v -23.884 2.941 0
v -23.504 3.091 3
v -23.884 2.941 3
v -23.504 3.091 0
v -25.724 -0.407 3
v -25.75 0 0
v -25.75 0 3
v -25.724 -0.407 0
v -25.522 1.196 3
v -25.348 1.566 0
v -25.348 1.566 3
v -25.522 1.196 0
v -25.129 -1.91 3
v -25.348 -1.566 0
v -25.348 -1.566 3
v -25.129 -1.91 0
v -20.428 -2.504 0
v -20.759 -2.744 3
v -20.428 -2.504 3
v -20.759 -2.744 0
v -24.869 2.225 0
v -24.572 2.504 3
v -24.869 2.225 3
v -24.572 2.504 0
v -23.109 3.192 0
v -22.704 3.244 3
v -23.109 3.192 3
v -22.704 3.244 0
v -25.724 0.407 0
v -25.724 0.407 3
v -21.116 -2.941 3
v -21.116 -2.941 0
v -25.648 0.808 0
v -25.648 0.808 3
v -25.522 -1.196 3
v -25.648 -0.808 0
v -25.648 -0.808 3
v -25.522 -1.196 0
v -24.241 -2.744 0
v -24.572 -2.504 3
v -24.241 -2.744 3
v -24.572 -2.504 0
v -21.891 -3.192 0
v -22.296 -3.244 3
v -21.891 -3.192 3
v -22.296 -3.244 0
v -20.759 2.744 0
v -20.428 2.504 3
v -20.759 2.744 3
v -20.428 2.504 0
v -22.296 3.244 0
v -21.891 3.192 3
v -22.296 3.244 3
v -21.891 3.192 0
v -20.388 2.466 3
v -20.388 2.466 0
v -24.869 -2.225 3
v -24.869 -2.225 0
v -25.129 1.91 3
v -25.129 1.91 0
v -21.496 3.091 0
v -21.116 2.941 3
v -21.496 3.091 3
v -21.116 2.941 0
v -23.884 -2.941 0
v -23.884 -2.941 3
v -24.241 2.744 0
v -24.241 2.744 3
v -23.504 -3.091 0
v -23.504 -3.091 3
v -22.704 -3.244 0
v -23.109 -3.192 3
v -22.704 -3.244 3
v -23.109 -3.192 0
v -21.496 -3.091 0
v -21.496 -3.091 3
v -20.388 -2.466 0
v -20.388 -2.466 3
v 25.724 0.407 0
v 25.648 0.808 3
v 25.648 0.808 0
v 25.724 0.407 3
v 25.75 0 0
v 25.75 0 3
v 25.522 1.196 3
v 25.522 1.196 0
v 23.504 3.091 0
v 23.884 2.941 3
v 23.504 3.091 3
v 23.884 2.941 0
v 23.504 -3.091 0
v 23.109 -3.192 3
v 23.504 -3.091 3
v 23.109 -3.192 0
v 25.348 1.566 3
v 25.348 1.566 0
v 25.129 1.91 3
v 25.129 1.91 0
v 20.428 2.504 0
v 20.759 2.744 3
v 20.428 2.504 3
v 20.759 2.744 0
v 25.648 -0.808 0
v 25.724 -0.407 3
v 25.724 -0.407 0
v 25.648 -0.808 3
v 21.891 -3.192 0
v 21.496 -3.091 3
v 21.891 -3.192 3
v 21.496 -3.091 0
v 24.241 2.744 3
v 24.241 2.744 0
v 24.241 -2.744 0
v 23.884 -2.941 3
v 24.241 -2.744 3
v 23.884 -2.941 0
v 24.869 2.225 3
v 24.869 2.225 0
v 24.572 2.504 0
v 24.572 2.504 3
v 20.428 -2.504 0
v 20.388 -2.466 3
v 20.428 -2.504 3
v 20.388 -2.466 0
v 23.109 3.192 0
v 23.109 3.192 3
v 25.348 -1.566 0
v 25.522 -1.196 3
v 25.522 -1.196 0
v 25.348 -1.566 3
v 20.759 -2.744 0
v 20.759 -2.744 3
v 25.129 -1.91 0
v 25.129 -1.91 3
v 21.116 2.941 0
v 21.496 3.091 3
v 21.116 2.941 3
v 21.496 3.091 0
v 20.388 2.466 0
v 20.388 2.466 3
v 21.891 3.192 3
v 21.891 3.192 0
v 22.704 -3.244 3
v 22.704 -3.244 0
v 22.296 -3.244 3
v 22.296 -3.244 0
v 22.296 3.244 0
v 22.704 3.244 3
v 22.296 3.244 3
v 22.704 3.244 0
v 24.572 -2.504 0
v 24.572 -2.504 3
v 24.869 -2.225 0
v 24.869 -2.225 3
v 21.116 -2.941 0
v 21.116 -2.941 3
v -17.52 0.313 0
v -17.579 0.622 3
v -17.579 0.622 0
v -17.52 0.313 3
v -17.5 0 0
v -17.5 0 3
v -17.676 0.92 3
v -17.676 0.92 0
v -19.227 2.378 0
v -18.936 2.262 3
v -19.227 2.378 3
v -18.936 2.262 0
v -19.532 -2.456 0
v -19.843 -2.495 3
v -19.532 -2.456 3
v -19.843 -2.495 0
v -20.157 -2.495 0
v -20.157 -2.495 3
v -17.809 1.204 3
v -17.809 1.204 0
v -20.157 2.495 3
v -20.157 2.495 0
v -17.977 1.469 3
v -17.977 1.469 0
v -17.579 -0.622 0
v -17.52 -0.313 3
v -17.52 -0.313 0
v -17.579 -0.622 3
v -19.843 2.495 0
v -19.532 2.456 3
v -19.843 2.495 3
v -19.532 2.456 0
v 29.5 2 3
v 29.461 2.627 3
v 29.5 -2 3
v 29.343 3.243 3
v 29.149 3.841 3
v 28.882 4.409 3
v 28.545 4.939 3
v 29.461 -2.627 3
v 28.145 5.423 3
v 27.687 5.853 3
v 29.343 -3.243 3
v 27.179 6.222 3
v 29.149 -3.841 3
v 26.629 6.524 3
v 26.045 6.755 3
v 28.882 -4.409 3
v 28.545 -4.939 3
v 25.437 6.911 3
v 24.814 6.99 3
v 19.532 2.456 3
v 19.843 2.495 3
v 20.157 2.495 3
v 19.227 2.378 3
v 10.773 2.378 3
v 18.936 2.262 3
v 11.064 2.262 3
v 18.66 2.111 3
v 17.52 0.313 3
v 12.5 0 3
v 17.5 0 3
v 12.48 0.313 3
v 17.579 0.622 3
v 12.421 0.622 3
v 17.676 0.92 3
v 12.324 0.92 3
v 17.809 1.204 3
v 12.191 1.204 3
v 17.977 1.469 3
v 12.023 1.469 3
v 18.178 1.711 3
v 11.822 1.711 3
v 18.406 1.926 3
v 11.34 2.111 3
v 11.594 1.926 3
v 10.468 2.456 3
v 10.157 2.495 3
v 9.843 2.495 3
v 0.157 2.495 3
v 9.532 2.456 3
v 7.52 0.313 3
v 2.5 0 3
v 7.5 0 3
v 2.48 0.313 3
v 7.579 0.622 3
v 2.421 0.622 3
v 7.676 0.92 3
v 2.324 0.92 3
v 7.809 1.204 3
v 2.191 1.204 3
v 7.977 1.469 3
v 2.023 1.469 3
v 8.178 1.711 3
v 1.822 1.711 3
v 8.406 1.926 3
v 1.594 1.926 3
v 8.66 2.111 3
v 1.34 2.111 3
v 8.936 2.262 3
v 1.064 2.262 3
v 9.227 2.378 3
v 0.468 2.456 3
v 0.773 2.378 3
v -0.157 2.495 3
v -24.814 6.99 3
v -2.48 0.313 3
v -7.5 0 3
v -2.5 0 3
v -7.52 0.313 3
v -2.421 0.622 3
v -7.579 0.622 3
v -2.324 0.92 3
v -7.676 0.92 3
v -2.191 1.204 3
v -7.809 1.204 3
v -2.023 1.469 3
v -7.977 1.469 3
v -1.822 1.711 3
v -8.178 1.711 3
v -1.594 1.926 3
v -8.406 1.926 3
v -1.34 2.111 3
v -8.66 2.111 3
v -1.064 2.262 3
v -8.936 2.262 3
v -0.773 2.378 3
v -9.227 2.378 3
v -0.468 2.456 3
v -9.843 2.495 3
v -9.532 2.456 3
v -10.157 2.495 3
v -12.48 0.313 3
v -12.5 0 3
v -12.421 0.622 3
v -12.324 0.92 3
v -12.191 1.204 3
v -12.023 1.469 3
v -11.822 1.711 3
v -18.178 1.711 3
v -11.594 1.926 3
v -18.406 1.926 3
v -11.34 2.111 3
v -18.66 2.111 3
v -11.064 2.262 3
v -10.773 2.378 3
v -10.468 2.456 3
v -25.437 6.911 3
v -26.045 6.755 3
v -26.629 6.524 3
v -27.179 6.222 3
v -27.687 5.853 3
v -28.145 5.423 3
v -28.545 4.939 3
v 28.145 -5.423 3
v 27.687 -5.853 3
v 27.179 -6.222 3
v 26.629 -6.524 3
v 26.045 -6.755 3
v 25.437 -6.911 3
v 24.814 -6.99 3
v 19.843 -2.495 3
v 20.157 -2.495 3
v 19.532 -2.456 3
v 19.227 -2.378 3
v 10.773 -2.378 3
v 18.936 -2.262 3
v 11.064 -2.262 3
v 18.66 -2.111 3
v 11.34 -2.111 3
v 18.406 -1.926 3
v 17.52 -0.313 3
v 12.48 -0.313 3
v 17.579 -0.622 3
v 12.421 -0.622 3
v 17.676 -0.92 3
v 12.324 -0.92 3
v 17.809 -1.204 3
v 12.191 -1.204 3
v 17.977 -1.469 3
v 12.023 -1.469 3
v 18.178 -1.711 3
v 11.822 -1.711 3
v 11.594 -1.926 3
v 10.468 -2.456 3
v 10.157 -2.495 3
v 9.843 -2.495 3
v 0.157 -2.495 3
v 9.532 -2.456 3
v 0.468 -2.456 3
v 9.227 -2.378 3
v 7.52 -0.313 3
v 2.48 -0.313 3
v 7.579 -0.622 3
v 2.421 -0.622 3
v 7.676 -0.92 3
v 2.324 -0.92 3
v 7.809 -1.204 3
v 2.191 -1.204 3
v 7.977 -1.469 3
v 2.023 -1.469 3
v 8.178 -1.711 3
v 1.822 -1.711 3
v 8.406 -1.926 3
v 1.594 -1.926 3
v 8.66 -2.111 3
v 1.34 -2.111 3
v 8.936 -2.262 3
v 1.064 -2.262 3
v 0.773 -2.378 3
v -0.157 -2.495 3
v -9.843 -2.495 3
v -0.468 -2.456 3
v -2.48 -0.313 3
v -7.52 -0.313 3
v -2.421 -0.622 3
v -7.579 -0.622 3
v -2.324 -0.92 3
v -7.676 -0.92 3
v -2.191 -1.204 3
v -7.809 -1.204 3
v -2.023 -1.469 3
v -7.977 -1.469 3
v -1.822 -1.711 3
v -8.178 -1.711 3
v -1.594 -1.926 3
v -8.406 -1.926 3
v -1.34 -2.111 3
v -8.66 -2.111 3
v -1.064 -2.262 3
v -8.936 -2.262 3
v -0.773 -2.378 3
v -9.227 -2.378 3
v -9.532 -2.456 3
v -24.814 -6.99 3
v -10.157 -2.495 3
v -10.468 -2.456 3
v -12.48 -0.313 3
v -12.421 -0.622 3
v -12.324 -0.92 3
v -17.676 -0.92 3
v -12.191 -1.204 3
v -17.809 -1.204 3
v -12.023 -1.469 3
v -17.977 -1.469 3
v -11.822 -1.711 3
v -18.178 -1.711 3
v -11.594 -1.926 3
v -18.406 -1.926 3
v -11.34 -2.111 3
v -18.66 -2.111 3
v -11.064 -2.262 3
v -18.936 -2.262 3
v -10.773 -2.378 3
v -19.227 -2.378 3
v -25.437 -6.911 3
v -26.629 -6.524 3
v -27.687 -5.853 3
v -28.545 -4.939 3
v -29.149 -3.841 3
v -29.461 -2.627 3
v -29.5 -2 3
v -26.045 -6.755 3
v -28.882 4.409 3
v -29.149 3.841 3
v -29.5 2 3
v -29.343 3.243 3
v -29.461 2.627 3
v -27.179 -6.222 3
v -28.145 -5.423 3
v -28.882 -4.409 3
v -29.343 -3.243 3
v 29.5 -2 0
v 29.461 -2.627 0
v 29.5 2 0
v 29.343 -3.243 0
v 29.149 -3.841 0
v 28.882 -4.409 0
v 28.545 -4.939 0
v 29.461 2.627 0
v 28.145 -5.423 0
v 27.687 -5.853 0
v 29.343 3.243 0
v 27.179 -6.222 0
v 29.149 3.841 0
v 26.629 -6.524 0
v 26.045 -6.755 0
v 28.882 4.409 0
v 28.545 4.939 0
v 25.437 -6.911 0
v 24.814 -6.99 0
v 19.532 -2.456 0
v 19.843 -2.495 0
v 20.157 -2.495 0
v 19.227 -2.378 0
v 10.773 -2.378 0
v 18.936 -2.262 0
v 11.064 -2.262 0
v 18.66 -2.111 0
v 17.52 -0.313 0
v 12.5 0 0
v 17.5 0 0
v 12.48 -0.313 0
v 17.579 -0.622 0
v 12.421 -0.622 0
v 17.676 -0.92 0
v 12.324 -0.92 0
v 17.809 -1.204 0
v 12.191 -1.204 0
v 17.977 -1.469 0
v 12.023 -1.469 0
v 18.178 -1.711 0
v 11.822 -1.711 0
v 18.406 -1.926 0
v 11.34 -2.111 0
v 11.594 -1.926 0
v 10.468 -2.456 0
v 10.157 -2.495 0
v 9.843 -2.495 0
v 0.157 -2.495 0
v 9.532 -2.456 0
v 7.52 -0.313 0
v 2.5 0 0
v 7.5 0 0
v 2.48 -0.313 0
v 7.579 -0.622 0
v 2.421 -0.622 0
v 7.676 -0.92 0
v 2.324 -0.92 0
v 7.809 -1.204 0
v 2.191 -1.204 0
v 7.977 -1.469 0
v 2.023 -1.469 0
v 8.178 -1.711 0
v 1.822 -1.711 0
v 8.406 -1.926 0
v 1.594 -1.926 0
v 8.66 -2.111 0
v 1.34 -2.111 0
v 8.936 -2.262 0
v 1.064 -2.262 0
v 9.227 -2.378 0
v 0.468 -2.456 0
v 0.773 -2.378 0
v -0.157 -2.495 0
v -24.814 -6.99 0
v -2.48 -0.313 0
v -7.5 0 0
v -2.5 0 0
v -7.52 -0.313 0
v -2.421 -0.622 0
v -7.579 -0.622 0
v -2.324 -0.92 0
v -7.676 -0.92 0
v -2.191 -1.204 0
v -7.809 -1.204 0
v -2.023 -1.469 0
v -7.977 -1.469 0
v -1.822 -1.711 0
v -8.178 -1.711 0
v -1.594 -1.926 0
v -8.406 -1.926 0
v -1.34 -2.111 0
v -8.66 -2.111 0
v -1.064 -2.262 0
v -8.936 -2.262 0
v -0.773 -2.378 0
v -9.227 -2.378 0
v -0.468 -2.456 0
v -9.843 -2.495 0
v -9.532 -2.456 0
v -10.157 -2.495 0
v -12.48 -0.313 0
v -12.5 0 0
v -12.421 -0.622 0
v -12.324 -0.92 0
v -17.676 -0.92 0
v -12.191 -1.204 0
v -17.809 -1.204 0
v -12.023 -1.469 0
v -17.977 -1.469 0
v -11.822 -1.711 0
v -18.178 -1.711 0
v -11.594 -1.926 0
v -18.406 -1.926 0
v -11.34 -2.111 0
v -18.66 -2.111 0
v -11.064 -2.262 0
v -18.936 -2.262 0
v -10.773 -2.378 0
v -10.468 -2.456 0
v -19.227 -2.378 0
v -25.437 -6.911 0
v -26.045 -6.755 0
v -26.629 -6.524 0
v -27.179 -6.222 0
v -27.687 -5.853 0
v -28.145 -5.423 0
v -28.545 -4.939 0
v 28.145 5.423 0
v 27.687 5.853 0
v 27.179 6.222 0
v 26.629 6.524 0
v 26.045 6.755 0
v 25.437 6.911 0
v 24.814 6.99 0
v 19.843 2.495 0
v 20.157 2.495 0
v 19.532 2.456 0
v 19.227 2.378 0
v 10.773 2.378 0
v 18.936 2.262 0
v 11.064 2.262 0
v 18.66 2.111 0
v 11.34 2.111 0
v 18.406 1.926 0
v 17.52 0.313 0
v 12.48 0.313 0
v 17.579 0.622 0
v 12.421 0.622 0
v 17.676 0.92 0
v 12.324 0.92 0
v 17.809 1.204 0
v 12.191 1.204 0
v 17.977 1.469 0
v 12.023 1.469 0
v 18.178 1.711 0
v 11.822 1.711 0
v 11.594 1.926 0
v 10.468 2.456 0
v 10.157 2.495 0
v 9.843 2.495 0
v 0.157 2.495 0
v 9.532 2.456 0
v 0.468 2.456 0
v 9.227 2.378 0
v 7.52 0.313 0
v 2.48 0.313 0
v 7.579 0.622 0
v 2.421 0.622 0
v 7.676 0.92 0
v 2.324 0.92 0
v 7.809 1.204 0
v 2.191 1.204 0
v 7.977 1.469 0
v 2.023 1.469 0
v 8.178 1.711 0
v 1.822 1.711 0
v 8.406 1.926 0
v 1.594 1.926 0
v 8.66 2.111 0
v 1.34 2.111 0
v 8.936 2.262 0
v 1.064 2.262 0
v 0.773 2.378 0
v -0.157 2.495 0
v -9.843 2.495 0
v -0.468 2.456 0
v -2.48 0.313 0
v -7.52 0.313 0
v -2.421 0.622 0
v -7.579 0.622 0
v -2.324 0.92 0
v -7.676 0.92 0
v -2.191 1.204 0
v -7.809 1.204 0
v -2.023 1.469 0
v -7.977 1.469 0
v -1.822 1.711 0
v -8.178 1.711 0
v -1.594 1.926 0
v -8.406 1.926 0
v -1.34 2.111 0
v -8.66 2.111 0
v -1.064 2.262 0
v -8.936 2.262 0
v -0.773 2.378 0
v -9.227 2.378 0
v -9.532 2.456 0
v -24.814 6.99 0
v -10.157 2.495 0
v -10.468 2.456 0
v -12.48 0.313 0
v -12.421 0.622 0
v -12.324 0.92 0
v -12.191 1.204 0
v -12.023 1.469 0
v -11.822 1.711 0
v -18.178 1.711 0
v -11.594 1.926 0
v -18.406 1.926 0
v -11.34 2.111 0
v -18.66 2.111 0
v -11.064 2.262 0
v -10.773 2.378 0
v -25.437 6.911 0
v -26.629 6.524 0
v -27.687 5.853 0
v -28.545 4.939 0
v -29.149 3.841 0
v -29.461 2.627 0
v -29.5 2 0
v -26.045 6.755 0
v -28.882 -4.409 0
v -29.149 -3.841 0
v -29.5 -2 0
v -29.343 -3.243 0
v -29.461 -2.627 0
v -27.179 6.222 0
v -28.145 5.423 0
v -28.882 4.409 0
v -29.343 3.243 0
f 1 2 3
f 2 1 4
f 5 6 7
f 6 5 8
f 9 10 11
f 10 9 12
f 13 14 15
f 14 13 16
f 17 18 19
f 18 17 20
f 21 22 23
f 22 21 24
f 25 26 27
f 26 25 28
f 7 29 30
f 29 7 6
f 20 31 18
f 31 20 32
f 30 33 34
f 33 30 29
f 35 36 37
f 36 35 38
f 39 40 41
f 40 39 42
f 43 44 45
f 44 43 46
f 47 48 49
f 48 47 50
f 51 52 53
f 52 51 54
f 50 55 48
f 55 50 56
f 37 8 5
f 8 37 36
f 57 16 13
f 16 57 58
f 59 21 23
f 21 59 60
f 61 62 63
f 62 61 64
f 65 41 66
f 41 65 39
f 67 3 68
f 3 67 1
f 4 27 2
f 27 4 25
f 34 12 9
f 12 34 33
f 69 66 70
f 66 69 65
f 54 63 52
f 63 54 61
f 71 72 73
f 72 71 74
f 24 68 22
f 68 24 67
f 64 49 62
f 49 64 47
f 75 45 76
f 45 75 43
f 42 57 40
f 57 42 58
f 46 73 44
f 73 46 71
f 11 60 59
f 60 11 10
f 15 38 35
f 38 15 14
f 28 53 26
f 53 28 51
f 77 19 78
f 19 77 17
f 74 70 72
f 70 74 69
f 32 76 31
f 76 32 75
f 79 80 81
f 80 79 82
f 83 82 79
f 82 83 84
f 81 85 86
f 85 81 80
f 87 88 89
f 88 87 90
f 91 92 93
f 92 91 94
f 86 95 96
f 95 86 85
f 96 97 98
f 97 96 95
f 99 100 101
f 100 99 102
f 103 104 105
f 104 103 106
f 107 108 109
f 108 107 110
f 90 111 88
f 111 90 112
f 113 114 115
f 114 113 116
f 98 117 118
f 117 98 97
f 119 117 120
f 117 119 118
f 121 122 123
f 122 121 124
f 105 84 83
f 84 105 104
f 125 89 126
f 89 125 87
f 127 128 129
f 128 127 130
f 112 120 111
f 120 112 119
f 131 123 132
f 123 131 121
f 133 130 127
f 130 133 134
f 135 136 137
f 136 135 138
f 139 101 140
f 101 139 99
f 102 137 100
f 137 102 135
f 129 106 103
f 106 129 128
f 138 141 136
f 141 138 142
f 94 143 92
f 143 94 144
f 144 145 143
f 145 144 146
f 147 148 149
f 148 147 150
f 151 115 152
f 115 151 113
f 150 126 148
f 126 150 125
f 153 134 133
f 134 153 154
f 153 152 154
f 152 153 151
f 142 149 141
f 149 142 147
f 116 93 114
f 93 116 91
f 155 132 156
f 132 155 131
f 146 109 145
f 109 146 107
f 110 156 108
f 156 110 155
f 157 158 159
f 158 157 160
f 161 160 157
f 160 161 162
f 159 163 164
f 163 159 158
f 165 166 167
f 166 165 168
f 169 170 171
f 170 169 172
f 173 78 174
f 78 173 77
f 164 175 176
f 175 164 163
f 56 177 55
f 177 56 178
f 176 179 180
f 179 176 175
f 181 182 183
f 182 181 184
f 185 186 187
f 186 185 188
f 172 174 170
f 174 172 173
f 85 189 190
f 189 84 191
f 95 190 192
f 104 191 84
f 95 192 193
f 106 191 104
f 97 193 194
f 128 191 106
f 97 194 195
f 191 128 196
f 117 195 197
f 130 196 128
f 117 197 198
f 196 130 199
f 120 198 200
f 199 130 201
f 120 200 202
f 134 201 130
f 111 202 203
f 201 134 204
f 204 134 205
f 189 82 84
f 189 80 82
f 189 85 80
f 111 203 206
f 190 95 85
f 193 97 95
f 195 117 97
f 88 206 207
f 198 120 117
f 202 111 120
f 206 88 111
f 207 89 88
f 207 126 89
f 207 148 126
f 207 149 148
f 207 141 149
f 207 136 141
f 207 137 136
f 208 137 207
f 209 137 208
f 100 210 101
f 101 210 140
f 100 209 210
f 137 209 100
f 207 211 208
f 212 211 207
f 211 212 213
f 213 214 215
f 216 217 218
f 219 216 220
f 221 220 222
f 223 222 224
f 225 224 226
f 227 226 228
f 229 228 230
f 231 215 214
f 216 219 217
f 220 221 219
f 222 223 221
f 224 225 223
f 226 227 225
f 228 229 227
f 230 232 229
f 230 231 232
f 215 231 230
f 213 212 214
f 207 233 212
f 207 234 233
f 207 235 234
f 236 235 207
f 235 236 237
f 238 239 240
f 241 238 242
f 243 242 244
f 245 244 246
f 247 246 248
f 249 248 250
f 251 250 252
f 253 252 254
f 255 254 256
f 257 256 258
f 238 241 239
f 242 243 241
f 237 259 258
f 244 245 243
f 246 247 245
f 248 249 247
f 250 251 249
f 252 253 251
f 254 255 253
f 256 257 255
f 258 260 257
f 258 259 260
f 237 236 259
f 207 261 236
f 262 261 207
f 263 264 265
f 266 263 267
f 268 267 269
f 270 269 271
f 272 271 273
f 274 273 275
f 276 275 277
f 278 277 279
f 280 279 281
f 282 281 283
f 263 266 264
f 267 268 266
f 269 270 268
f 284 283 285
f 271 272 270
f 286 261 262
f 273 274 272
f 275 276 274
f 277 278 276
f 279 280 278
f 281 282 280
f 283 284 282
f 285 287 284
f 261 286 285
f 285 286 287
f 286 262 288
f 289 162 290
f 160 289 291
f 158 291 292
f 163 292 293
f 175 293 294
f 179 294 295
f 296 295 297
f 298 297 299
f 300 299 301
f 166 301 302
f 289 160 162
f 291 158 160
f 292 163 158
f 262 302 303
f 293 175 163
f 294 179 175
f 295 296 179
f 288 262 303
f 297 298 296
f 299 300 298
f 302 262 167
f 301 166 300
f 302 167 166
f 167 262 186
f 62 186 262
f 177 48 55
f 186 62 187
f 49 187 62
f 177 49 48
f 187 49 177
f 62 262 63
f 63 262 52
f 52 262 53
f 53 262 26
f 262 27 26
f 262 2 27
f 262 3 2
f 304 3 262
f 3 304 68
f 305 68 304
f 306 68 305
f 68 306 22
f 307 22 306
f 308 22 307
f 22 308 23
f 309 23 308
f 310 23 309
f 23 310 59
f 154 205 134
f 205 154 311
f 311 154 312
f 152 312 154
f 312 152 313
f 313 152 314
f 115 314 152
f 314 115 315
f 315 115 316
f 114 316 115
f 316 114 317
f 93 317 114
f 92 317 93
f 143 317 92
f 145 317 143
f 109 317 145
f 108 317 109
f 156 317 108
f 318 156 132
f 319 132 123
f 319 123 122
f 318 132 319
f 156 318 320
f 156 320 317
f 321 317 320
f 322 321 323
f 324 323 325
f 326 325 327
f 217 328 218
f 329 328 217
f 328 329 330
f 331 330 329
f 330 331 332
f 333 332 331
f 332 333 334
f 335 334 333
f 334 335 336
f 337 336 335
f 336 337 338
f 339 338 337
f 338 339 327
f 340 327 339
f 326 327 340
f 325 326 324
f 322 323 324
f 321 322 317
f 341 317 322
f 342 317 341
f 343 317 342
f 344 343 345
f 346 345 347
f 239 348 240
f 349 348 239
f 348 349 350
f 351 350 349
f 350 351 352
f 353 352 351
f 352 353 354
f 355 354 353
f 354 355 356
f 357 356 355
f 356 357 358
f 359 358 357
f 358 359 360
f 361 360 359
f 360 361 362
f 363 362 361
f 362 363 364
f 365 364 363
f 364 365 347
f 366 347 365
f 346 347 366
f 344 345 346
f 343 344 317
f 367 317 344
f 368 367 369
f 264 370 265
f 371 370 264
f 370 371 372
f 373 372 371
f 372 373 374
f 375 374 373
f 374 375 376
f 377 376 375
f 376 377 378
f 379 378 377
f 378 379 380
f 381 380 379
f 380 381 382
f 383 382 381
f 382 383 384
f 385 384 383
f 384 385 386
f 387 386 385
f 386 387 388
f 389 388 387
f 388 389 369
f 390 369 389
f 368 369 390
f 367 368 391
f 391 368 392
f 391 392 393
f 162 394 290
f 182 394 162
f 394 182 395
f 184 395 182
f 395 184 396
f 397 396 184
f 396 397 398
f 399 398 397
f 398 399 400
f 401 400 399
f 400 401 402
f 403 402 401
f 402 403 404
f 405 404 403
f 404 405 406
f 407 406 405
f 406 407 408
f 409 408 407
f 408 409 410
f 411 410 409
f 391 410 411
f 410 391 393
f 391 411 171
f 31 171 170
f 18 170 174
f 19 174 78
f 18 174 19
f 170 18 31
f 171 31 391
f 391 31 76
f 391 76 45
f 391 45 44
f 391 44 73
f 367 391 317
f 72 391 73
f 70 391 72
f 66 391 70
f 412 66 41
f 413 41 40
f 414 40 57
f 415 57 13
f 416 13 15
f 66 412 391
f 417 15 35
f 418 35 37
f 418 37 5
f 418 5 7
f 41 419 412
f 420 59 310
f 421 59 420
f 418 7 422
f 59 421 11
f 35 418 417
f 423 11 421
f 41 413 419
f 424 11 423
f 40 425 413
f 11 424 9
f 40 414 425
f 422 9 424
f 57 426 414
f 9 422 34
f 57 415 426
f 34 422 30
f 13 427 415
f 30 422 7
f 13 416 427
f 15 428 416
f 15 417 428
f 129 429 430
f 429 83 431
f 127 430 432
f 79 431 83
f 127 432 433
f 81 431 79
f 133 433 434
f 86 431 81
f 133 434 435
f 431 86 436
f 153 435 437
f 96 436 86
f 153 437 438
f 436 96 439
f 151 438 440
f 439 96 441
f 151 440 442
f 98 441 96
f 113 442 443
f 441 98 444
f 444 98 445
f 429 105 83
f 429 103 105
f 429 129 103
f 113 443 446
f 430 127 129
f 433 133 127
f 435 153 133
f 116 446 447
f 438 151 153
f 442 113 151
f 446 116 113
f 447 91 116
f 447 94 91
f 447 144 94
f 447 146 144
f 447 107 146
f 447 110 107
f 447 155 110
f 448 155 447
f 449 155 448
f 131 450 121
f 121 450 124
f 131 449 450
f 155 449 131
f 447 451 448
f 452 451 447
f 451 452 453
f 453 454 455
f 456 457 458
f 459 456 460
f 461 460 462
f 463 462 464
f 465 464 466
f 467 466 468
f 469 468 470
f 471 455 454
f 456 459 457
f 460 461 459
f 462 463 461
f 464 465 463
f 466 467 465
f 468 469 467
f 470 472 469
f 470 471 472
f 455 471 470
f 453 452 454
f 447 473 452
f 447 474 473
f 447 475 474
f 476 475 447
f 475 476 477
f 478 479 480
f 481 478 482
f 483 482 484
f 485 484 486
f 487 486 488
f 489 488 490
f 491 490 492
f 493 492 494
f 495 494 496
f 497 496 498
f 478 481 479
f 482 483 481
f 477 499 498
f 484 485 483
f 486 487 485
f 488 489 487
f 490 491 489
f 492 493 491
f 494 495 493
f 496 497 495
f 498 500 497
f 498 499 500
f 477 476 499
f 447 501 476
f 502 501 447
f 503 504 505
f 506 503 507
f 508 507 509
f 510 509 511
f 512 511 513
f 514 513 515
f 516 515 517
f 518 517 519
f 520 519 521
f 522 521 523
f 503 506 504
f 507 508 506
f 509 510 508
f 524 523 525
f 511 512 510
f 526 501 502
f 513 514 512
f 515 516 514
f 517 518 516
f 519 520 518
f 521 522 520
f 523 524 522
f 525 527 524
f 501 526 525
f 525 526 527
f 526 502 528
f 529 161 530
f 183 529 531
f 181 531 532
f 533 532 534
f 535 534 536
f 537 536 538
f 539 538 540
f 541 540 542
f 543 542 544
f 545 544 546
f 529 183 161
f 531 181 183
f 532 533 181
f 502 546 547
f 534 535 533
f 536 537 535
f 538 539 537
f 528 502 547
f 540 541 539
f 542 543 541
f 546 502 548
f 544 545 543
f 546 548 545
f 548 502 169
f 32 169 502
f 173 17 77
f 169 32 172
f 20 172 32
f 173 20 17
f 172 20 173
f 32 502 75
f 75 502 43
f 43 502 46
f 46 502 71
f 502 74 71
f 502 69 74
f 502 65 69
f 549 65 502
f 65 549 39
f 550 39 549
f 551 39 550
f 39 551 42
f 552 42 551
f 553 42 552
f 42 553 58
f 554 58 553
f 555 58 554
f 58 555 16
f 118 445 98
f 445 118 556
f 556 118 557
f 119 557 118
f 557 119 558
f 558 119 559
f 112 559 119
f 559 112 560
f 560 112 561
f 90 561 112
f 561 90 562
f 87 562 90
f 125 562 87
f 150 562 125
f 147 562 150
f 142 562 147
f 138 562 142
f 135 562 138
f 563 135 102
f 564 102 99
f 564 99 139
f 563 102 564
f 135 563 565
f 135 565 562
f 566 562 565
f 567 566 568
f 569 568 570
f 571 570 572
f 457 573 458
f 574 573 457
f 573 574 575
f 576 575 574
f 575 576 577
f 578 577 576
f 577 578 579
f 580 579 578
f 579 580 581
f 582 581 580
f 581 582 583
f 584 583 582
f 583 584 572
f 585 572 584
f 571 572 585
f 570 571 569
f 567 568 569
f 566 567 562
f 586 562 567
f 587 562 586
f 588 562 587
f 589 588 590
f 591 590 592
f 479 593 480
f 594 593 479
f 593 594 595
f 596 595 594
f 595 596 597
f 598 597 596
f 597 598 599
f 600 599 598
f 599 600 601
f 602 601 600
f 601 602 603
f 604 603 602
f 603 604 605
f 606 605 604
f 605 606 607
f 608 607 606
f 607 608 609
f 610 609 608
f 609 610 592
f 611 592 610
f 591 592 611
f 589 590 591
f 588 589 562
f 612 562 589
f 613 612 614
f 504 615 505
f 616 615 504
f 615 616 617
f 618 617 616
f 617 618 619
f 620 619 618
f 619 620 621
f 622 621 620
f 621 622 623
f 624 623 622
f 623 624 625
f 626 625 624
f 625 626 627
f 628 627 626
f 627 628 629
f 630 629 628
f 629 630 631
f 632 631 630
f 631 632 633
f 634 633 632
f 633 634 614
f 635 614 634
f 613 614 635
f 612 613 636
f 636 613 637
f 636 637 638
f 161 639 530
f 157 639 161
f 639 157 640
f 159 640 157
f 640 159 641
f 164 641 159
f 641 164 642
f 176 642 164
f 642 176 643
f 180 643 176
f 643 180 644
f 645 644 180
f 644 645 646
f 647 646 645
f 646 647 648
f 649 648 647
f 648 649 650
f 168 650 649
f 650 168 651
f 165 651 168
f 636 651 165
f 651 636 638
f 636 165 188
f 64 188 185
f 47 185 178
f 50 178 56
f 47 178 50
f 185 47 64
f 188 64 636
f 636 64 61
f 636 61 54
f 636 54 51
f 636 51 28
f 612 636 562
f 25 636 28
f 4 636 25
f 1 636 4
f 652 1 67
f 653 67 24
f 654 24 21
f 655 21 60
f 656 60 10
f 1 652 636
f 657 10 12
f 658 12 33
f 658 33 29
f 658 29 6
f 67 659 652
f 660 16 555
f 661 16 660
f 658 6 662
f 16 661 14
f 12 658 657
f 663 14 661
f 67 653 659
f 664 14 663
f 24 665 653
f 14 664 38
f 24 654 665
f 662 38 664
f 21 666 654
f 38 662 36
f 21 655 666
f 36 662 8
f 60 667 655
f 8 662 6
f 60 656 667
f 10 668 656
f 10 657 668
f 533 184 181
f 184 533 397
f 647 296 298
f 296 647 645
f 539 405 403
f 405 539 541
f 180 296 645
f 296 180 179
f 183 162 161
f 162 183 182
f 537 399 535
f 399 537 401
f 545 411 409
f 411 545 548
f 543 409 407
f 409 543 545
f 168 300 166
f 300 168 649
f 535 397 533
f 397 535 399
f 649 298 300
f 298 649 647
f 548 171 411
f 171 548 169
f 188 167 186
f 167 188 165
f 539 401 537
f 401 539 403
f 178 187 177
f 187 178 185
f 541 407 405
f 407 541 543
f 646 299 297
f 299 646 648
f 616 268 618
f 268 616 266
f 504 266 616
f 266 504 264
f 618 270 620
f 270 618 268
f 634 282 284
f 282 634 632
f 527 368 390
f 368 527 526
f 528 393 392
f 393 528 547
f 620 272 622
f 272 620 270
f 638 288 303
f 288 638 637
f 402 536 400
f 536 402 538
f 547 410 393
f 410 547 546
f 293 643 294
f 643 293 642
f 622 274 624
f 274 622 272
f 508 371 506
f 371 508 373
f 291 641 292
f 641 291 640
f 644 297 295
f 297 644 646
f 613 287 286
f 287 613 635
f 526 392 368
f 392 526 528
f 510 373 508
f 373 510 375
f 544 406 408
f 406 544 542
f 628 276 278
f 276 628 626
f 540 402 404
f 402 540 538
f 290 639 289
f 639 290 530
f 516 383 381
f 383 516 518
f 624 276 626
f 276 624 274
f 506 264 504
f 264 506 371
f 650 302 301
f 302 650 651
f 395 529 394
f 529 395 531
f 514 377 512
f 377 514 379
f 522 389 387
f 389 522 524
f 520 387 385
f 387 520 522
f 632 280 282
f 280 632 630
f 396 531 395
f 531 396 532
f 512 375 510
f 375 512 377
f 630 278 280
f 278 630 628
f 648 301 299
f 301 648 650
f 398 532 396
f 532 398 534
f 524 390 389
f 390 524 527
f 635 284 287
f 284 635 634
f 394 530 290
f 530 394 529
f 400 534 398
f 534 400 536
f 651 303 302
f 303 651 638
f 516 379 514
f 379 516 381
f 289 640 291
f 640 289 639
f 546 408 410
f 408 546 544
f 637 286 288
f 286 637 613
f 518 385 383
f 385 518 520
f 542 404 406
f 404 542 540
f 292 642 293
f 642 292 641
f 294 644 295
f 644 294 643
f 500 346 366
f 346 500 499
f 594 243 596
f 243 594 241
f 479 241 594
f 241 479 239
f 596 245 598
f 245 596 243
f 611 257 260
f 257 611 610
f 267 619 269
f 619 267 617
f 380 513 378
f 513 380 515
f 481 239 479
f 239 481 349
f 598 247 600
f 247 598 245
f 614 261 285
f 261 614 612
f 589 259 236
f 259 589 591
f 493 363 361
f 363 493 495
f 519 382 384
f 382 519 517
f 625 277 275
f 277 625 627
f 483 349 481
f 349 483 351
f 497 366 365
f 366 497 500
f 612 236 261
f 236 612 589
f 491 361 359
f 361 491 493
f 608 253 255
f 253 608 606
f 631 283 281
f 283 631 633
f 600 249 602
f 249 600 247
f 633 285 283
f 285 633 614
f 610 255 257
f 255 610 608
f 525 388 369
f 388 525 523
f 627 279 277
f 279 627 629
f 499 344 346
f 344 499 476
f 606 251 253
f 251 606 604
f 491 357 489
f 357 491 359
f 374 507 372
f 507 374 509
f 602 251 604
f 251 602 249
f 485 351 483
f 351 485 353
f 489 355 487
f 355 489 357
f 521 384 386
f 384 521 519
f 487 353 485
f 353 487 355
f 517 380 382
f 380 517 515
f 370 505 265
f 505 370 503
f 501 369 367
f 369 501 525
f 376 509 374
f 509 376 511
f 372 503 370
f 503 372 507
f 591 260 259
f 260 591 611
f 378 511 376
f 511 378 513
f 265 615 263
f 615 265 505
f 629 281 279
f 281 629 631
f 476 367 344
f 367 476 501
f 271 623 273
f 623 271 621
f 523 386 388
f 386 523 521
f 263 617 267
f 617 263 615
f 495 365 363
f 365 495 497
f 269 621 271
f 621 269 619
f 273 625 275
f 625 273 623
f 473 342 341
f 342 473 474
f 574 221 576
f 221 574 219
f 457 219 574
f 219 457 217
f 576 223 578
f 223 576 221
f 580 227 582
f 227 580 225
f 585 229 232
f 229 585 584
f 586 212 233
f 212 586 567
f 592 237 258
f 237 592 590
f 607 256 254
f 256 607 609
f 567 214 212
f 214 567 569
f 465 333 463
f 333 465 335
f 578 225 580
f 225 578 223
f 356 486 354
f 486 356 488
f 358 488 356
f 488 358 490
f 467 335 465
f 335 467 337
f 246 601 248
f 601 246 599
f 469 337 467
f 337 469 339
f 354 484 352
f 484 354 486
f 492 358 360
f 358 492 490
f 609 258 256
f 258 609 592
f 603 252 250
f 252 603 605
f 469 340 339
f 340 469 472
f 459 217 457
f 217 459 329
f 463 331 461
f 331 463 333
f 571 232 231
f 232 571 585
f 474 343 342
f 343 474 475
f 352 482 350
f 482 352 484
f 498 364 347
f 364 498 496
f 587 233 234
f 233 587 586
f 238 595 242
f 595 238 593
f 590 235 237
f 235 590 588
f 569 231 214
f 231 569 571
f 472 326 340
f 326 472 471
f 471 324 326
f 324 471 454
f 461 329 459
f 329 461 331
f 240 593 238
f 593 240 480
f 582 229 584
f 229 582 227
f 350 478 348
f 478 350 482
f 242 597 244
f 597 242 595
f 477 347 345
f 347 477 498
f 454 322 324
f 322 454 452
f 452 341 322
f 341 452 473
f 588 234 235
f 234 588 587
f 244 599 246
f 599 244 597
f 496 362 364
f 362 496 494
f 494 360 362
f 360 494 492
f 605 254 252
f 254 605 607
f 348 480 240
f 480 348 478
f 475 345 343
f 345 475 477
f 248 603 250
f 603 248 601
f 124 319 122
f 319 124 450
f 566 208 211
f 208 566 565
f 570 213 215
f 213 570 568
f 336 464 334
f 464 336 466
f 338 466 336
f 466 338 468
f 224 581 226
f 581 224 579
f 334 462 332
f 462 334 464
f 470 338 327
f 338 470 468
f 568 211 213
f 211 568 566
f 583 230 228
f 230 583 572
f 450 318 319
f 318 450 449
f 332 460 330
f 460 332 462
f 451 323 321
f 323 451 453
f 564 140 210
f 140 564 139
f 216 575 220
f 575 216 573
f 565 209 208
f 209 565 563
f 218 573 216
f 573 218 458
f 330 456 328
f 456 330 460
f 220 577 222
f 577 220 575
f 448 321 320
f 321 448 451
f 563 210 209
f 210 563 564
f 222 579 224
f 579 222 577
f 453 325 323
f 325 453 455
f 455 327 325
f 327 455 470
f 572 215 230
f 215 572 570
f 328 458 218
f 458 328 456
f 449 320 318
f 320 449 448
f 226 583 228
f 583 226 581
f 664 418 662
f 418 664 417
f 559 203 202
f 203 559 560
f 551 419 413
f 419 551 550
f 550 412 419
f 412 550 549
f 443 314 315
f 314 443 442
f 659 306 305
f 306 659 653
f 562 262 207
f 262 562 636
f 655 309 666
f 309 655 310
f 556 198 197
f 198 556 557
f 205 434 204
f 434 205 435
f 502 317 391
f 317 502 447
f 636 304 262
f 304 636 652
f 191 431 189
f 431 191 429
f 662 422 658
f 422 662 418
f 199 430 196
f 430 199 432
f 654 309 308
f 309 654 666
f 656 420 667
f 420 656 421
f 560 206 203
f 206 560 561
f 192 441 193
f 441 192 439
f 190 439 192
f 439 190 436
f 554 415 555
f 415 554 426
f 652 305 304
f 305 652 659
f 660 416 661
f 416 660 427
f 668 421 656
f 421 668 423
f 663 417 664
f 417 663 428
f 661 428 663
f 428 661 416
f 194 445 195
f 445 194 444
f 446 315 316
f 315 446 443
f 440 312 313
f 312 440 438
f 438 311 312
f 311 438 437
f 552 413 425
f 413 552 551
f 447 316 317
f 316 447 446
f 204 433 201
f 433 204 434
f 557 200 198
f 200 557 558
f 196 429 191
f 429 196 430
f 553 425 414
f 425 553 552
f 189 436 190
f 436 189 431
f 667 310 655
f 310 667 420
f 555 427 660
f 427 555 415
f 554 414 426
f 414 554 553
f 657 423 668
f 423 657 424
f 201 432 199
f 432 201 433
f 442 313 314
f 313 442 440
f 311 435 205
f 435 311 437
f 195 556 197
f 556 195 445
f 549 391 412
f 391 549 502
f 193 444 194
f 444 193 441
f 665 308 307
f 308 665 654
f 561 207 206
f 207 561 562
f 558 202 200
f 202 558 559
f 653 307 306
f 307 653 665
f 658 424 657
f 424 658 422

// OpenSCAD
$fn = 50;

difference() {
	union() {
		hull() {
			translate(v = [-24.5, 2.0, 0]) {
				cylinder(h = 3, r = 5);
			}
			translate(v = [24.5, 2.0, 0]) {
				cylinder(h = 3, r = 5);
			}
			translate(v = [-24.5, -2.0, 0]) {
				cylinder(h = 3, r = 5);
			}
			translate(v = [24.5, -2.0, 0]) {
				cylinder(h = 3, r = 5);
			}
		}
	}
	union() {
		translate(v = [-22.5, 0.0, -100.0]) {
			cylinder(h = 200, r = 3.25);
		}
		translate(v = [22.5, 0.0, -100.0]) {
			cylinder(h = 200, r = 3.25);
		}
		translate(v = [-22.5, 0.0, -100.0]) {
			cylinder(h = 200, r = 1.8);
		}
		translate(v = [22.5, 0.0, -100.0]) {
			cylinder(h = 200, r = 1.8);
		}
		translate(v = [-20.0, 0, 0.0]) {
			cylinder(h = 3, r = 2.5);
		}
		translate(v = [-10.0, 0, 0.0]) {
			cylinder(h = 3, r = 2.5);
		}
		cylinder(h = 3, r = 2.5);
		translate(v = [10.0, 0, 0.0]) {
			cylinder(h = 3, r = 2.5);
		}
		translate(v = [20.0, 0, 0.0]) {
			cylinder(h = 3, r = 2.5);
		}
	}
}
